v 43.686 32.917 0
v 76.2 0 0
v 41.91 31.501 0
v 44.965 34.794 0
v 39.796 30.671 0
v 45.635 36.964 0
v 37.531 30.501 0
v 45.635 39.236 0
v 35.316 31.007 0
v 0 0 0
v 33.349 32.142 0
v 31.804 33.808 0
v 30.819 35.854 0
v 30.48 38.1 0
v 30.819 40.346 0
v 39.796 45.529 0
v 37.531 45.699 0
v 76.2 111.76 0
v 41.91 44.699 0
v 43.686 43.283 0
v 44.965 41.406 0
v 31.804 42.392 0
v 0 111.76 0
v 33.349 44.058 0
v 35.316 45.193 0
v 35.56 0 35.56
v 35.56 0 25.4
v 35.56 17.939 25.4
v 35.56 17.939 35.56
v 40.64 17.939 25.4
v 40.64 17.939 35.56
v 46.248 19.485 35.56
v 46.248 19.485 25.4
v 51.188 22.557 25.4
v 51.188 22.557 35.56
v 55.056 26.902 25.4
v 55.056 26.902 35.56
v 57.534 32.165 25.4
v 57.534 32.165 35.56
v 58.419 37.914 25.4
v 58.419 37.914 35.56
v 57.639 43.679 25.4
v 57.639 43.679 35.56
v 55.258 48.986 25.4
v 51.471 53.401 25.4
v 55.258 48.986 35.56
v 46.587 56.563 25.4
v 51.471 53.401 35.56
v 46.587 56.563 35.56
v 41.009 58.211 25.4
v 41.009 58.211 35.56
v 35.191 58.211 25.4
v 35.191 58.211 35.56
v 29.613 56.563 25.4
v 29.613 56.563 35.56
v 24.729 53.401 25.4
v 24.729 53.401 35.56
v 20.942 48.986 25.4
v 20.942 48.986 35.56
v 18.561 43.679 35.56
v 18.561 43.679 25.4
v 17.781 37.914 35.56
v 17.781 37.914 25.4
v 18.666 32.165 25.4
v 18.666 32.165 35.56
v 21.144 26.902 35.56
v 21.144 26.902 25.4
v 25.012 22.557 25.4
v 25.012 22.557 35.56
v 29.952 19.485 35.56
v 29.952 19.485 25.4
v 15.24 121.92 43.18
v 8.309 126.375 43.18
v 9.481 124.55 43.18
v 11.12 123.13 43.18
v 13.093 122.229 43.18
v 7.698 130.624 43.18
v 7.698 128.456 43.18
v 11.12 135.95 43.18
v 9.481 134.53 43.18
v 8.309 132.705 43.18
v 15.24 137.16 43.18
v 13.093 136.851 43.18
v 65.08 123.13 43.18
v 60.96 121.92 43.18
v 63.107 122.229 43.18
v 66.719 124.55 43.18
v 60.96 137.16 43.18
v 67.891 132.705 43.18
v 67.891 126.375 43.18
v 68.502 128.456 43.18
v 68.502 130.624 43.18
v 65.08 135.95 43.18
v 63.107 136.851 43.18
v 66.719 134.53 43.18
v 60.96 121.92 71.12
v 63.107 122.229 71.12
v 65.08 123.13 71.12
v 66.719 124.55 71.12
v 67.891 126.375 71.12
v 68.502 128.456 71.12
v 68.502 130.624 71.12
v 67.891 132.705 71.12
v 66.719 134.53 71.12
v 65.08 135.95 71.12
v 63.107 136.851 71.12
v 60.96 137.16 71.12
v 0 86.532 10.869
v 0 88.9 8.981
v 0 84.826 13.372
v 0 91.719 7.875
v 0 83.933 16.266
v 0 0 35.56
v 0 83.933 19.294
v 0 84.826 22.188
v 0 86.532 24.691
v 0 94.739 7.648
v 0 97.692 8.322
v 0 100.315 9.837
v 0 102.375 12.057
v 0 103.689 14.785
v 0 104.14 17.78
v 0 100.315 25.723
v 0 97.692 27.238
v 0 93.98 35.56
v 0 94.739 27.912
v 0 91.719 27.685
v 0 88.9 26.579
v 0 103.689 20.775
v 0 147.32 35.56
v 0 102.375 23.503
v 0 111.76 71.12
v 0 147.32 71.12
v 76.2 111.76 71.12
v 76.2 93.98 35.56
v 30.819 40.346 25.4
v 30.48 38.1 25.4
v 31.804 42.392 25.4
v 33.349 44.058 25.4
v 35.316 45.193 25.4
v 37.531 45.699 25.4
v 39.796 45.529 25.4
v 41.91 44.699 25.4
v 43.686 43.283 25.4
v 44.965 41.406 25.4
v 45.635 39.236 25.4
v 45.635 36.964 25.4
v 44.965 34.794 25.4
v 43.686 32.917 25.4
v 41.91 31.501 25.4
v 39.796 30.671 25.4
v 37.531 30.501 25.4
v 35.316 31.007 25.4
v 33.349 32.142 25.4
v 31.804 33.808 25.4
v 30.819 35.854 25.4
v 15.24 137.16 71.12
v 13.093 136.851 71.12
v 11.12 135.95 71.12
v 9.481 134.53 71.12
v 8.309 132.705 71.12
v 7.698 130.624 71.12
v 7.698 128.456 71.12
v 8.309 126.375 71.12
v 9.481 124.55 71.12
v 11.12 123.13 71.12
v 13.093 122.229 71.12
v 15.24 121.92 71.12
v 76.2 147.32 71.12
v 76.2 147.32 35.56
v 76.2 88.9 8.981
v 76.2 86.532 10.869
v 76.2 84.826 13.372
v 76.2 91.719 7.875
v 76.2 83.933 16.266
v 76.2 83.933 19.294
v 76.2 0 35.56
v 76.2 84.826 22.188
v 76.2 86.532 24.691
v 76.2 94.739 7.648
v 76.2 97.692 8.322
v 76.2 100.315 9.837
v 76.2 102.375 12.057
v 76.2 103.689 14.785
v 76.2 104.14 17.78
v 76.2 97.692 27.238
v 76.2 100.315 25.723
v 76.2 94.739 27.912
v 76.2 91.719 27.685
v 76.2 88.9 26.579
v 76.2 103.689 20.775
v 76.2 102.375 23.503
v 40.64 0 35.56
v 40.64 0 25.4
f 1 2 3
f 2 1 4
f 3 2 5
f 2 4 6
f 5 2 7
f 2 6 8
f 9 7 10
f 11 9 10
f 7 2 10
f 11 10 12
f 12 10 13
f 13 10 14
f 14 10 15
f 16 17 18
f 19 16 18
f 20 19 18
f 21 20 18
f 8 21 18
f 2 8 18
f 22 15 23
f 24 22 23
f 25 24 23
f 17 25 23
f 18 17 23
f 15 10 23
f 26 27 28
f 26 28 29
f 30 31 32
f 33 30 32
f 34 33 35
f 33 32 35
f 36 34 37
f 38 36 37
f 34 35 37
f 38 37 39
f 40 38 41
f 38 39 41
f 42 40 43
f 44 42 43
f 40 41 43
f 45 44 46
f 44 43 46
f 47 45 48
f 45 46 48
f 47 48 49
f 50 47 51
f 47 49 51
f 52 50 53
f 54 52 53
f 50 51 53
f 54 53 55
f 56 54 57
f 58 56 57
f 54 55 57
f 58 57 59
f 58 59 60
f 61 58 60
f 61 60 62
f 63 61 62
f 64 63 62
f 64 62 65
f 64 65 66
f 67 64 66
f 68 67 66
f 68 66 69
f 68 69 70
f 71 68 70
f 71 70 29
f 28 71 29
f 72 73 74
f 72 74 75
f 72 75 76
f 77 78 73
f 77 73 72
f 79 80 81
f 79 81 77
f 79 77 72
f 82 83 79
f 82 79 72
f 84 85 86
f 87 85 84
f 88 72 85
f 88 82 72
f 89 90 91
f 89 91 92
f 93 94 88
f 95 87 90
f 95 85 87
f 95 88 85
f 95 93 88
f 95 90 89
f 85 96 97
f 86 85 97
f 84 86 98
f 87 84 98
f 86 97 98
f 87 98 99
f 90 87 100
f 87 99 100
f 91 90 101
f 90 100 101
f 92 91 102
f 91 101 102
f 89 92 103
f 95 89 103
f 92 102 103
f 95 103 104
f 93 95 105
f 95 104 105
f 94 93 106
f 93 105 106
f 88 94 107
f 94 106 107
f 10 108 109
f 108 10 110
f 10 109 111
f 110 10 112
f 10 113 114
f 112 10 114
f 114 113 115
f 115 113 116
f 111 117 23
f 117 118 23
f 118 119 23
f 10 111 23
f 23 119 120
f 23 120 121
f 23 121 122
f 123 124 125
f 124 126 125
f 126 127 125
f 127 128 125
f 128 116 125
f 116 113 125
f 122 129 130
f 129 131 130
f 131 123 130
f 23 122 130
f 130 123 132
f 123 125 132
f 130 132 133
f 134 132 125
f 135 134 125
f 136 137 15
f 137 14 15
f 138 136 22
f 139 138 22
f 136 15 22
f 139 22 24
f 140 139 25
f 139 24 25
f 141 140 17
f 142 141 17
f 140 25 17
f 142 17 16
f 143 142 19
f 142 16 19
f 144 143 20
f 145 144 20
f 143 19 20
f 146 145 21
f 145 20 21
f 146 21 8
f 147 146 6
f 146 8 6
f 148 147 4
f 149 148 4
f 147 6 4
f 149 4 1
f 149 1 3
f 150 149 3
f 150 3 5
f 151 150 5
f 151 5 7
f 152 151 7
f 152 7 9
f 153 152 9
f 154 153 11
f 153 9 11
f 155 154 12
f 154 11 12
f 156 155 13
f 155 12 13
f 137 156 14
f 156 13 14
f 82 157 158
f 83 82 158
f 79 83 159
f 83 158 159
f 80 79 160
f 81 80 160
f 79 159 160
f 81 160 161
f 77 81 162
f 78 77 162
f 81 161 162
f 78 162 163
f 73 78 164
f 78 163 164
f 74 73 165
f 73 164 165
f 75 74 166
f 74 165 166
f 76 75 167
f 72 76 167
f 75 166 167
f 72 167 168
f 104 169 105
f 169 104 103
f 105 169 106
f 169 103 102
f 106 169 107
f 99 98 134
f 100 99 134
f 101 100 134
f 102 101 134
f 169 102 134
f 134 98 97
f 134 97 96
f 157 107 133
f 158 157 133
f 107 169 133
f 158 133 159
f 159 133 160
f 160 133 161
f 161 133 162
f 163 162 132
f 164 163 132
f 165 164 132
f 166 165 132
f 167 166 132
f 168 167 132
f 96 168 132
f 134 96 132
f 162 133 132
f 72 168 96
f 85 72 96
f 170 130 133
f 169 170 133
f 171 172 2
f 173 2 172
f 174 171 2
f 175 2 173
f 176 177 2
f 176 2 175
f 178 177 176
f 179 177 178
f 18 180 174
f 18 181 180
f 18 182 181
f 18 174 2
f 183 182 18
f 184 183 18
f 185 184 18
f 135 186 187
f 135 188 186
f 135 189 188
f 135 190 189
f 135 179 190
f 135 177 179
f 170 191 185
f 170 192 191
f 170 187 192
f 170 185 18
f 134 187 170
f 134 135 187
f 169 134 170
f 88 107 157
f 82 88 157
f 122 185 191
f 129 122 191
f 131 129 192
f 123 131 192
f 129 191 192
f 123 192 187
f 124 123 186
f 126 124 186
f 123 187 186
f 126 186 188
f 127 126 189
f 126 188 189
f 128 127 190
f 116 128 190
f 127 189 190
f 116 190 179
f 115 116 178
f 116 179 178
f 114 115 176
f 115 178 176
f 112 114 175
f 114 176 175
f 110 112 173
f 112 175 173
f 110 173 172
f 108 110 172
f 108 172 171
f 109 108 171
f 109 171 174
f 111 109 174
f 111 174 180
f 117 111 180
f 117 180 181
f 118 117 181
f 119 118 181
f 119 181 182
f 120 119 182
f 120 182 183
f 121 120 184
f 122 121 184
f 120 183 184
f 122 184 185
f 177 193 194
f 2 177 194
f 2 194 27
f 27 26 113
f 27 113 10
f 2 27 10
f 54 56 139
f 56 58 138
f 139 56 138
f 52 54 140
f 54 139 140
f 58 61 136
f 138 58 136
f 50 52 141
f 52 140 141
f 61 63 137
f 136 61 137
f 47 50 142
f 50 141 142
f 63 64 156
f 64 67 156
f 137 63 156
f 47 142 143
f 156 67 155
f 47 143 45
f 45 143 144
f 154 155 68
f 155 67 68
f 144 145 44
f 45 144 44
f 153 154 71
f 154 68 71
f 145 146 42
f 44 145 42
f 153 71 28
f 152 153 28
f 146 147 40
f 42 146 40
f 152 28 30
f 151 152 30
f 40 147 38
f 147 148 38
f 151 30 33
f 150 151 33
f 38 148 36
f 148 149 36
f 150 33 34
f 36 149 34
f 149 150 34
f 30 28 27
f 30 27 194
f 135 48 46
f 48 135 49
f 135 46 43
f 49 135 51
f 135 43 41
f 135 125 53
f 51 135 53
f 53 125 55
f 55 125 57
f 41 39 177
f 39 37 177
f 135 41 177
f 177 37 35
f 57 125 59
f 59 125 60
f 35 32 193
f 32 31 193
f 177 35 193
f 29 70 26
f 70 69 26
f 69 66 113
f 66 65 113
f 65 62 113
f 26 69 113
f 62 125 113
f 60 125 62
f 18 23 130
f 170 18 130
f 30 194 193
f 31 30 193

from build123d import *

# Parameters (mm, degrees)
F1_DEPTH       = 76.2
F2_R           = 10.16
F3_DEPTH       = 76.2
F5_DEPTH       = 27.94
F7_D           = 15.24
F7_CBORE_D     = 40.64
F7_CBORE_DEPTH = 10.16
F8_W           = 5.08
F8_H           = 10.16
F9_DEPTH       = 19.05


with BuildPart() as f1:
    # F0 (on Right) → F1 (new body)
    with BuildSketch(Plane.YZ):
        Polygon((0, 35.56), (0, 0), (111.76, 0), (147.32, 35.56), (147.32, 71.12), (111.76, 71.12), (93.98, 35.56), align=None)
    extrude(amount=F1_DEPTH)

    # F2 (on face) → F3 (cut, through all)
    with BuildSketch(Plane.YZ.offset(76.2)):
        with Locations((93.98, 17.78)):
            Circle(F2_R)
    extrude(amount=-F3_DEPTH, mode=Mode.SUBTRACT)

    # F4 (on face) → F5 (cut)
    with BuildSketch(Plane.XY.offset(71.12)):
        with BuildLine():
            ThreePointArc((15.24, 137.16), (7.62, 129.54), (15.24, 121.92))
            Line((15.24, 121.92), (60.96, 121.92))
            ThreePointArc((60.96, 121.92), (68.58, 129.54), (60.96, 137.16))
            Line((60.96, 137.16), (15.24, 137.16))
        make_face()
    extrude(amount=-F5_DEPTH, mode=Mode.SUBTRACT)

    # F7 (through all)
    with Locations(Plane.XY.offset(35.56)):
        with Locations((38.1, 38.1)):
            CounterBoreHole(F7_D / 2, F7_CBORE_D / 2, F7_CBORE_DEPTH)

    # F8 (on face) → F9 (cut)
    with BuildSketch(Plane.XZ):
        with Locations((38.1, 30.48)):
            Rectangle(F8_W, F8_H)
    extrude(amount=-F9_DEPTH, mode=Mode.SUBTRACT)


solid = f1.part
